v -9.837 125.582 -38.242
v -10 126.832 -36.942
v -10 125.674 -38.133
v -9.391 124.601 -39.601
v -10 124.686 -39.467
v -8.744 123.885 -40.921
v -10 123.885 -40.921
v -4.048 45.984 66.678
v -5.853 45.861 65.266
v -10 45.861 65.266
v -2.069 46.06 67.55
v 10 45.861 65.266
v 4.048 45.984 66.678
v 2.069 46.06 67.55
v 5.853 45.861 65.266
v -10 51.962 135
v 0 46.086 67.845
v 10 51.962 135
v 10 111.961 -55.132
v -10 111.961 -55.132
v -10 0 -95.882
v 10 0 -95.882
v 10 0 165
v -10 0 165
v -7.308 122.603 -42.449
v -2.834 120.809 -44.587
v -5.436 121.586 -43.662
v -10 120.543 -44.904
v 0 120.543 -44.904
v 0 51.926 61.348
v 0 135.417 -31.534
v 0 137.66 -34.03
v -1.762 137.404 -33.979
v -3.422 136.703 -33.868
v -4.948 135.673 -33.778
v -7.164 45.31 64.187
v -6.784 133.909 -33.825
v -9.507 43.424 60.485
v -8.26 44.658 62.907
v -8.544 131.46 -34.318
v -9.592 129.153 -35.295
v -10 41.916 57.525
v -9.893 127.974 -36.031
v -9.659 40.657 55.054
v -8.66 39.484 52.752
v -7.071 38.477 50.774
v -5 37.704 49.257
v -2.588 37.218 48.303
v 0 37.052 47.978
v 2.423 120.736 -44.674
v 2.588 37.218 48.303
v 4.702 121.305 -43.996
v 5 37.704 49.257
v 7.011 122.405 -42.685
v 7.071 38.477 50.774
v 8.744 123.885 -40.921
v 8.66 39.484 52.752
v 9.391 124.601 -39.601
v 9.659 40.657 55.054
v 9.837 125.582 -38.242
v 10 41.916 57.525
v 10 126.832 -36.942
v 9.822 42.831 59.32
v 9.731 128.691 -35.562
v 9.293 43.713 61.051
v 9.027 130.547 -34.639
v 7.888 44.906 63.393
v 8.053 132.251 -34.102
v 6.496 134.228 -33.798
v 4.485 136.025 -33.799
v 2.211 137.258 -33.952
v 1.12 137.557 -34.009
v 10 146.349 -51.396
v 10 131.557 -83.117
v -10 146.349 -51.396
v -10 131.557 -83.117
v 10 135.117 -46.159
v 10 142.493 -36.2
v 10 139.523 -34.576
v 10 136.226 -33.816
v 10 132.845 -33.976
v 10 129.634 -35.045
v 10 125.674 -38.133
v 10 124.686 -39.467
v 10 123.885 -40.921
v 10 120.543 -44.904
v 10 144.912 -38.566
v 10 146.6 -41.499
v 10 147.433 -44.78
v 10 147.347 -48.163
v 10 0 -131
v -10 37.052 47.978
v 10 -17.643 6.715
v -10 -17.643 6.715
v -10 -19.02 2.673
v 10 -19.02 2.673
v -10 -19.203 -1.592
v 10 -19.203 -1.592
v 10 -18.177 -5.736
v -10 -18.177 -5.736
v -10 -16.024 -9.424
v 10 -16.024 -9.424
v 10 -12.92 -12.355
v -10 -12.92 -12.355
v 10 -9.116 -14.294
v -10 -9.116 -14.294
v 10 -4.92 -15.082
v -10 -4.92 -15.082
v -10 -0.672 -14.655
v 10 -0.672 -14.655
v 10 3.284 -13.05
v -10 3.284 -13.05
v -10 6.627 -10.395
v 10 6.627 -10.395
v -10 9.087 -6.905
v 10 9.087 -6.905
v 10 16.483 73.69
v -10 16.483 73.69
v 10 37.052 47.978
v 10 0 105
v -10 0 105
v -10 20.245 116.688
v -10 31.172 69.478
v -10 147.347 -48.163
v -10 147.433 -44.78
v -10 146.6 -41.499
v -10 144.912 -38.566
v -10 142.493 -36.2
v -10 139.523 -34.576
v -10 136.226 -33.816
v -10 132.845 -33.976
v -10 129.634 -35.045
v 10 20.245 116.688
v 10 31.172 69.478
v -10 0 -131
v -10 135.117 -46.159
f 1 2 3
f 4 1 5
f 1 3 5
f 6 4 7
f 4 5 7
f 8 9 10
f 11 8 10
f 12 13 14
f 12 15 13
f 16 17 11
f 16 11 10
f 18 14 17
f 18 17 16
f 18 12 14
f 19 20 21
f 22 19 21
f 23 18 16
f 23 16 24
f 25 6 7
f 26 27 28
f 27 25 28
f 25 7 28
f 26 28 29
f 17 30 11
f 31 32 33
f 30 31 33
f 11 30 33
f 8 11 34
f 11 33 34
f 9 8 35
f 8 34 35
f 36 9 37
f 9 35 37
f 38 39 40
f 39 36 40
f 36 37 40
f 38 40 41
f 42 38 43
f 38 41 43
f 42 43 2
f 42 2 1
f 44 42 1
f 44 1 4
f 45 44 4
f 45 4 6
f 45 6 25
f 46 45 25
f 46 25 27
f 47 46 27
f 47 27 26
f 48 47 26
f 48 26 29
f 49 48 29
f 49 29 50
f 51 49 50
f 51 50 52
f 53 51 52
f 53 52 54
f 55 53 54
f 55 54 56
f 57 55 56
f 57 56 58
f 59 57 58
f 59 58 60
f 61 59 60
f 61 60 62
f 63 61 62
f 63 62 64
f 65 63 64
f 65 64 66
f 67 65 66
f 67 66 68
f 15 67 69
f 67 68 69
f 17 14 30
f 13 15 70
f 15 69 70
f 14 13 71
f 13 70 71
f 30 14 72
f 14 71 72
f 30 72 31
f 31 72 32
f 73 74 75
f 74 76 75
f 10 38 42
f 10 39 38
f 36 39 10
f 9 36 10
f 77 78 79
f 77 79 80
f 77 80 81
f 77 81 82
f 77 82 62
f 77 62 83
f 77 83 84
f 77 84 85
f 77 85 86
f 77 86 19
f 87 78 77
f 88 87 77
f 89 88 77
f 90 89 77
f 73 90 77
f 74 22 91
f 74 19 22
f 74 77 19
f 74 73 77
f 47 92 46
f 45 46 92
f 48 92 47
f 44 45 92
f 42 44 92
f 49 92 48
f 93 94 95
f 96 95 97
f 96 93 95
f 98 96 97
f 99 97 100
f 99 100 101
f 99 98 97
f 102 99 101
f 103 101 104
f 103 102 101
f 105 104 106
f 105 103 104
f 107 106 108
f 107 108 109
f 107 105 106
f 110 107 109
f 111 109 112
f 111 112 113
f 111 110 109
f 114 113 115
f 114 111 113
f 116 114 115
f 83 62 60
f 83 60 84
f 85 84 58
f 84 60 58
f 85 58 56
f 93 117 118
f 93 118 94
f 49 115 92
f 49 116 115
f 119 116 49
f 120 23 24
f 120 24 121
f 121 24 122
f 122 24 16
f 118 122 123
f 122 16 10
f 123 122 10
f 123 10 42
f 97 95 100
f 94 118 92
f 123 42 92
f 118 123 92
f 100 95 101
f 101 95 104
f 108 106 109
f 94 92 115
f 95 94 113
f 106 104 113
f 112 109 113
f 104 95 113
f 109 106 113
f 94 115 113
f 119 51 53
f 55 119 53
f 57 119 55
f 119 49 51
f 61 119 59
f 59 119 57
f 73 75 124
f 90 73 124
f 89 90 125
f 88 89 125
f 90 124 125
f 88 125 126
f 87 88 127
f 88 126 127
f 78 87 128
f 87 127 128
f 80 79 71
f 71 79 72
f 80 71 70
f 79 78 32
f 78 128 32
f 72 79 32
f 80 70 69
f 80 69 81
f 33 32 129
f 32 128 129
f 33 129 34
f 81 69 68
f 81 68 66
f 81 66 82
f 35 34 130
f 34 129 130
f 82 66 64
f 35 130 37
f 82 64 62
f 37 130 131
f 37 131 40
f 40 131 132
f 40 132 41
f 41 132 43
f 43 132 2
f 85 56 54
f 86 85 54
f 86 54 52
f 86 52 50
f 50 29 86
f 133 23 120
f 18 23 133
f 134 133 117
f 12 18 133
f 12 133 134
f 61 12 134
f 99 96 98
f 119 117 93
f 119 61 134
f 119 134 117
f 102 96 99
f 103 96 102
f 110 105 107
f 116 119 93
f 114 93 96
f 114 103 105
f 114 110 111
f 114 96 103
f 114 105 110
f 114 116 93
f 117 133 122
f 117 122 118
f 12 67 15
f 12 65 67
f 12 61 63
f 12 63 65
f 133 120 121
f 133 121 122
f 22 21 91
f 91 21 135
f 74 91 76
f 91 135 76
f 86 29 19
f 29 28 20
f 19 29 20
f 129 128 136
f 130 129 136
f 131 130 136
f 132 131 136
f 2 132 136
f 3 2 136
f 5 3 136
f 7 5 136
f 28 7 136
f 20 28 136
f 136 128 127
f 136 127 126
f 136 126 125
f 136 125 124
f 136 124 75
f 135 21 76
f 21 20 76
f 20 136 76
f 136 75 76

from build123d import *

# Parameters (mm, degrees)
EXTRUDE_1_DEPTH = 10


with BuildPart() as part:
    # 草图1 → 旋转1 (revolve)
    with BuildSketch(Plane(origin=(0, 0, 0), x_dir=(0, 0, -1), z_dir=(1, 0, 0))):
        Polygon((52.844000246, 127.679731381), (46.158922046, 135.116782508), (-69.478316775, 31.171822167), (-62.793238575, 23.73477104), align=None)
    revolve(axis=Axis((0, 135.116782508, -46.158922046), (0, -0.6685078200290915, 0.7437051126353456)))

    # 草图1<3> → 凸台-拉伸1 (add, symmetric)
    with BuildSketch(Plane(origin=(0, 0, 0), x_dir=(0, 0, -1), z_dir=(1, 0, 0))):
        with BuildLine():
            Line((95.882133508, 0), (131, 0))
            Line((131, 0), (83.117179934, 131.55696691))
            Line((83.117179934, 131.55696691), (51.396407388, 146.348606071))
            ThreePointArc((51.396407388, 146.348606071), (34.927098482, 140.35426785), (40.921436703, 123.884958945))
            Line((40.921436703, 123.884958945), (55.131576148, 111.961236177))
            Line((55.131576148, 111.961236177), (95.882133508, 0))
        make_face()
        with BuildLine():
            Line((6.905157326, 9.087391756), (-65.266371134, 45.860622235))
            Line((-65.266371134, 45.860622235), (-135, 51.961524227))
            Line((-135, 51.961524227), (-165, 0))
            Line((-165, 0), (-105, 0))
            Line((-105, 0), (-116.688381169, 20.244870042))
            Line((-116.688381169, 20.244870042), (-73.690262417, 16.483022099))
            Line((-73.690262417, 16.483022099), (-6.714557667, -17.64280397))
            ThreePointArc((-6.714557667, -17.64280397), (13.460397692, -11.087563603), (6.905157326, 9.087391756))
        make_face()
    extrude(amount=EXTRUDE_1_DEPTH, both=True)


solid = part.part
